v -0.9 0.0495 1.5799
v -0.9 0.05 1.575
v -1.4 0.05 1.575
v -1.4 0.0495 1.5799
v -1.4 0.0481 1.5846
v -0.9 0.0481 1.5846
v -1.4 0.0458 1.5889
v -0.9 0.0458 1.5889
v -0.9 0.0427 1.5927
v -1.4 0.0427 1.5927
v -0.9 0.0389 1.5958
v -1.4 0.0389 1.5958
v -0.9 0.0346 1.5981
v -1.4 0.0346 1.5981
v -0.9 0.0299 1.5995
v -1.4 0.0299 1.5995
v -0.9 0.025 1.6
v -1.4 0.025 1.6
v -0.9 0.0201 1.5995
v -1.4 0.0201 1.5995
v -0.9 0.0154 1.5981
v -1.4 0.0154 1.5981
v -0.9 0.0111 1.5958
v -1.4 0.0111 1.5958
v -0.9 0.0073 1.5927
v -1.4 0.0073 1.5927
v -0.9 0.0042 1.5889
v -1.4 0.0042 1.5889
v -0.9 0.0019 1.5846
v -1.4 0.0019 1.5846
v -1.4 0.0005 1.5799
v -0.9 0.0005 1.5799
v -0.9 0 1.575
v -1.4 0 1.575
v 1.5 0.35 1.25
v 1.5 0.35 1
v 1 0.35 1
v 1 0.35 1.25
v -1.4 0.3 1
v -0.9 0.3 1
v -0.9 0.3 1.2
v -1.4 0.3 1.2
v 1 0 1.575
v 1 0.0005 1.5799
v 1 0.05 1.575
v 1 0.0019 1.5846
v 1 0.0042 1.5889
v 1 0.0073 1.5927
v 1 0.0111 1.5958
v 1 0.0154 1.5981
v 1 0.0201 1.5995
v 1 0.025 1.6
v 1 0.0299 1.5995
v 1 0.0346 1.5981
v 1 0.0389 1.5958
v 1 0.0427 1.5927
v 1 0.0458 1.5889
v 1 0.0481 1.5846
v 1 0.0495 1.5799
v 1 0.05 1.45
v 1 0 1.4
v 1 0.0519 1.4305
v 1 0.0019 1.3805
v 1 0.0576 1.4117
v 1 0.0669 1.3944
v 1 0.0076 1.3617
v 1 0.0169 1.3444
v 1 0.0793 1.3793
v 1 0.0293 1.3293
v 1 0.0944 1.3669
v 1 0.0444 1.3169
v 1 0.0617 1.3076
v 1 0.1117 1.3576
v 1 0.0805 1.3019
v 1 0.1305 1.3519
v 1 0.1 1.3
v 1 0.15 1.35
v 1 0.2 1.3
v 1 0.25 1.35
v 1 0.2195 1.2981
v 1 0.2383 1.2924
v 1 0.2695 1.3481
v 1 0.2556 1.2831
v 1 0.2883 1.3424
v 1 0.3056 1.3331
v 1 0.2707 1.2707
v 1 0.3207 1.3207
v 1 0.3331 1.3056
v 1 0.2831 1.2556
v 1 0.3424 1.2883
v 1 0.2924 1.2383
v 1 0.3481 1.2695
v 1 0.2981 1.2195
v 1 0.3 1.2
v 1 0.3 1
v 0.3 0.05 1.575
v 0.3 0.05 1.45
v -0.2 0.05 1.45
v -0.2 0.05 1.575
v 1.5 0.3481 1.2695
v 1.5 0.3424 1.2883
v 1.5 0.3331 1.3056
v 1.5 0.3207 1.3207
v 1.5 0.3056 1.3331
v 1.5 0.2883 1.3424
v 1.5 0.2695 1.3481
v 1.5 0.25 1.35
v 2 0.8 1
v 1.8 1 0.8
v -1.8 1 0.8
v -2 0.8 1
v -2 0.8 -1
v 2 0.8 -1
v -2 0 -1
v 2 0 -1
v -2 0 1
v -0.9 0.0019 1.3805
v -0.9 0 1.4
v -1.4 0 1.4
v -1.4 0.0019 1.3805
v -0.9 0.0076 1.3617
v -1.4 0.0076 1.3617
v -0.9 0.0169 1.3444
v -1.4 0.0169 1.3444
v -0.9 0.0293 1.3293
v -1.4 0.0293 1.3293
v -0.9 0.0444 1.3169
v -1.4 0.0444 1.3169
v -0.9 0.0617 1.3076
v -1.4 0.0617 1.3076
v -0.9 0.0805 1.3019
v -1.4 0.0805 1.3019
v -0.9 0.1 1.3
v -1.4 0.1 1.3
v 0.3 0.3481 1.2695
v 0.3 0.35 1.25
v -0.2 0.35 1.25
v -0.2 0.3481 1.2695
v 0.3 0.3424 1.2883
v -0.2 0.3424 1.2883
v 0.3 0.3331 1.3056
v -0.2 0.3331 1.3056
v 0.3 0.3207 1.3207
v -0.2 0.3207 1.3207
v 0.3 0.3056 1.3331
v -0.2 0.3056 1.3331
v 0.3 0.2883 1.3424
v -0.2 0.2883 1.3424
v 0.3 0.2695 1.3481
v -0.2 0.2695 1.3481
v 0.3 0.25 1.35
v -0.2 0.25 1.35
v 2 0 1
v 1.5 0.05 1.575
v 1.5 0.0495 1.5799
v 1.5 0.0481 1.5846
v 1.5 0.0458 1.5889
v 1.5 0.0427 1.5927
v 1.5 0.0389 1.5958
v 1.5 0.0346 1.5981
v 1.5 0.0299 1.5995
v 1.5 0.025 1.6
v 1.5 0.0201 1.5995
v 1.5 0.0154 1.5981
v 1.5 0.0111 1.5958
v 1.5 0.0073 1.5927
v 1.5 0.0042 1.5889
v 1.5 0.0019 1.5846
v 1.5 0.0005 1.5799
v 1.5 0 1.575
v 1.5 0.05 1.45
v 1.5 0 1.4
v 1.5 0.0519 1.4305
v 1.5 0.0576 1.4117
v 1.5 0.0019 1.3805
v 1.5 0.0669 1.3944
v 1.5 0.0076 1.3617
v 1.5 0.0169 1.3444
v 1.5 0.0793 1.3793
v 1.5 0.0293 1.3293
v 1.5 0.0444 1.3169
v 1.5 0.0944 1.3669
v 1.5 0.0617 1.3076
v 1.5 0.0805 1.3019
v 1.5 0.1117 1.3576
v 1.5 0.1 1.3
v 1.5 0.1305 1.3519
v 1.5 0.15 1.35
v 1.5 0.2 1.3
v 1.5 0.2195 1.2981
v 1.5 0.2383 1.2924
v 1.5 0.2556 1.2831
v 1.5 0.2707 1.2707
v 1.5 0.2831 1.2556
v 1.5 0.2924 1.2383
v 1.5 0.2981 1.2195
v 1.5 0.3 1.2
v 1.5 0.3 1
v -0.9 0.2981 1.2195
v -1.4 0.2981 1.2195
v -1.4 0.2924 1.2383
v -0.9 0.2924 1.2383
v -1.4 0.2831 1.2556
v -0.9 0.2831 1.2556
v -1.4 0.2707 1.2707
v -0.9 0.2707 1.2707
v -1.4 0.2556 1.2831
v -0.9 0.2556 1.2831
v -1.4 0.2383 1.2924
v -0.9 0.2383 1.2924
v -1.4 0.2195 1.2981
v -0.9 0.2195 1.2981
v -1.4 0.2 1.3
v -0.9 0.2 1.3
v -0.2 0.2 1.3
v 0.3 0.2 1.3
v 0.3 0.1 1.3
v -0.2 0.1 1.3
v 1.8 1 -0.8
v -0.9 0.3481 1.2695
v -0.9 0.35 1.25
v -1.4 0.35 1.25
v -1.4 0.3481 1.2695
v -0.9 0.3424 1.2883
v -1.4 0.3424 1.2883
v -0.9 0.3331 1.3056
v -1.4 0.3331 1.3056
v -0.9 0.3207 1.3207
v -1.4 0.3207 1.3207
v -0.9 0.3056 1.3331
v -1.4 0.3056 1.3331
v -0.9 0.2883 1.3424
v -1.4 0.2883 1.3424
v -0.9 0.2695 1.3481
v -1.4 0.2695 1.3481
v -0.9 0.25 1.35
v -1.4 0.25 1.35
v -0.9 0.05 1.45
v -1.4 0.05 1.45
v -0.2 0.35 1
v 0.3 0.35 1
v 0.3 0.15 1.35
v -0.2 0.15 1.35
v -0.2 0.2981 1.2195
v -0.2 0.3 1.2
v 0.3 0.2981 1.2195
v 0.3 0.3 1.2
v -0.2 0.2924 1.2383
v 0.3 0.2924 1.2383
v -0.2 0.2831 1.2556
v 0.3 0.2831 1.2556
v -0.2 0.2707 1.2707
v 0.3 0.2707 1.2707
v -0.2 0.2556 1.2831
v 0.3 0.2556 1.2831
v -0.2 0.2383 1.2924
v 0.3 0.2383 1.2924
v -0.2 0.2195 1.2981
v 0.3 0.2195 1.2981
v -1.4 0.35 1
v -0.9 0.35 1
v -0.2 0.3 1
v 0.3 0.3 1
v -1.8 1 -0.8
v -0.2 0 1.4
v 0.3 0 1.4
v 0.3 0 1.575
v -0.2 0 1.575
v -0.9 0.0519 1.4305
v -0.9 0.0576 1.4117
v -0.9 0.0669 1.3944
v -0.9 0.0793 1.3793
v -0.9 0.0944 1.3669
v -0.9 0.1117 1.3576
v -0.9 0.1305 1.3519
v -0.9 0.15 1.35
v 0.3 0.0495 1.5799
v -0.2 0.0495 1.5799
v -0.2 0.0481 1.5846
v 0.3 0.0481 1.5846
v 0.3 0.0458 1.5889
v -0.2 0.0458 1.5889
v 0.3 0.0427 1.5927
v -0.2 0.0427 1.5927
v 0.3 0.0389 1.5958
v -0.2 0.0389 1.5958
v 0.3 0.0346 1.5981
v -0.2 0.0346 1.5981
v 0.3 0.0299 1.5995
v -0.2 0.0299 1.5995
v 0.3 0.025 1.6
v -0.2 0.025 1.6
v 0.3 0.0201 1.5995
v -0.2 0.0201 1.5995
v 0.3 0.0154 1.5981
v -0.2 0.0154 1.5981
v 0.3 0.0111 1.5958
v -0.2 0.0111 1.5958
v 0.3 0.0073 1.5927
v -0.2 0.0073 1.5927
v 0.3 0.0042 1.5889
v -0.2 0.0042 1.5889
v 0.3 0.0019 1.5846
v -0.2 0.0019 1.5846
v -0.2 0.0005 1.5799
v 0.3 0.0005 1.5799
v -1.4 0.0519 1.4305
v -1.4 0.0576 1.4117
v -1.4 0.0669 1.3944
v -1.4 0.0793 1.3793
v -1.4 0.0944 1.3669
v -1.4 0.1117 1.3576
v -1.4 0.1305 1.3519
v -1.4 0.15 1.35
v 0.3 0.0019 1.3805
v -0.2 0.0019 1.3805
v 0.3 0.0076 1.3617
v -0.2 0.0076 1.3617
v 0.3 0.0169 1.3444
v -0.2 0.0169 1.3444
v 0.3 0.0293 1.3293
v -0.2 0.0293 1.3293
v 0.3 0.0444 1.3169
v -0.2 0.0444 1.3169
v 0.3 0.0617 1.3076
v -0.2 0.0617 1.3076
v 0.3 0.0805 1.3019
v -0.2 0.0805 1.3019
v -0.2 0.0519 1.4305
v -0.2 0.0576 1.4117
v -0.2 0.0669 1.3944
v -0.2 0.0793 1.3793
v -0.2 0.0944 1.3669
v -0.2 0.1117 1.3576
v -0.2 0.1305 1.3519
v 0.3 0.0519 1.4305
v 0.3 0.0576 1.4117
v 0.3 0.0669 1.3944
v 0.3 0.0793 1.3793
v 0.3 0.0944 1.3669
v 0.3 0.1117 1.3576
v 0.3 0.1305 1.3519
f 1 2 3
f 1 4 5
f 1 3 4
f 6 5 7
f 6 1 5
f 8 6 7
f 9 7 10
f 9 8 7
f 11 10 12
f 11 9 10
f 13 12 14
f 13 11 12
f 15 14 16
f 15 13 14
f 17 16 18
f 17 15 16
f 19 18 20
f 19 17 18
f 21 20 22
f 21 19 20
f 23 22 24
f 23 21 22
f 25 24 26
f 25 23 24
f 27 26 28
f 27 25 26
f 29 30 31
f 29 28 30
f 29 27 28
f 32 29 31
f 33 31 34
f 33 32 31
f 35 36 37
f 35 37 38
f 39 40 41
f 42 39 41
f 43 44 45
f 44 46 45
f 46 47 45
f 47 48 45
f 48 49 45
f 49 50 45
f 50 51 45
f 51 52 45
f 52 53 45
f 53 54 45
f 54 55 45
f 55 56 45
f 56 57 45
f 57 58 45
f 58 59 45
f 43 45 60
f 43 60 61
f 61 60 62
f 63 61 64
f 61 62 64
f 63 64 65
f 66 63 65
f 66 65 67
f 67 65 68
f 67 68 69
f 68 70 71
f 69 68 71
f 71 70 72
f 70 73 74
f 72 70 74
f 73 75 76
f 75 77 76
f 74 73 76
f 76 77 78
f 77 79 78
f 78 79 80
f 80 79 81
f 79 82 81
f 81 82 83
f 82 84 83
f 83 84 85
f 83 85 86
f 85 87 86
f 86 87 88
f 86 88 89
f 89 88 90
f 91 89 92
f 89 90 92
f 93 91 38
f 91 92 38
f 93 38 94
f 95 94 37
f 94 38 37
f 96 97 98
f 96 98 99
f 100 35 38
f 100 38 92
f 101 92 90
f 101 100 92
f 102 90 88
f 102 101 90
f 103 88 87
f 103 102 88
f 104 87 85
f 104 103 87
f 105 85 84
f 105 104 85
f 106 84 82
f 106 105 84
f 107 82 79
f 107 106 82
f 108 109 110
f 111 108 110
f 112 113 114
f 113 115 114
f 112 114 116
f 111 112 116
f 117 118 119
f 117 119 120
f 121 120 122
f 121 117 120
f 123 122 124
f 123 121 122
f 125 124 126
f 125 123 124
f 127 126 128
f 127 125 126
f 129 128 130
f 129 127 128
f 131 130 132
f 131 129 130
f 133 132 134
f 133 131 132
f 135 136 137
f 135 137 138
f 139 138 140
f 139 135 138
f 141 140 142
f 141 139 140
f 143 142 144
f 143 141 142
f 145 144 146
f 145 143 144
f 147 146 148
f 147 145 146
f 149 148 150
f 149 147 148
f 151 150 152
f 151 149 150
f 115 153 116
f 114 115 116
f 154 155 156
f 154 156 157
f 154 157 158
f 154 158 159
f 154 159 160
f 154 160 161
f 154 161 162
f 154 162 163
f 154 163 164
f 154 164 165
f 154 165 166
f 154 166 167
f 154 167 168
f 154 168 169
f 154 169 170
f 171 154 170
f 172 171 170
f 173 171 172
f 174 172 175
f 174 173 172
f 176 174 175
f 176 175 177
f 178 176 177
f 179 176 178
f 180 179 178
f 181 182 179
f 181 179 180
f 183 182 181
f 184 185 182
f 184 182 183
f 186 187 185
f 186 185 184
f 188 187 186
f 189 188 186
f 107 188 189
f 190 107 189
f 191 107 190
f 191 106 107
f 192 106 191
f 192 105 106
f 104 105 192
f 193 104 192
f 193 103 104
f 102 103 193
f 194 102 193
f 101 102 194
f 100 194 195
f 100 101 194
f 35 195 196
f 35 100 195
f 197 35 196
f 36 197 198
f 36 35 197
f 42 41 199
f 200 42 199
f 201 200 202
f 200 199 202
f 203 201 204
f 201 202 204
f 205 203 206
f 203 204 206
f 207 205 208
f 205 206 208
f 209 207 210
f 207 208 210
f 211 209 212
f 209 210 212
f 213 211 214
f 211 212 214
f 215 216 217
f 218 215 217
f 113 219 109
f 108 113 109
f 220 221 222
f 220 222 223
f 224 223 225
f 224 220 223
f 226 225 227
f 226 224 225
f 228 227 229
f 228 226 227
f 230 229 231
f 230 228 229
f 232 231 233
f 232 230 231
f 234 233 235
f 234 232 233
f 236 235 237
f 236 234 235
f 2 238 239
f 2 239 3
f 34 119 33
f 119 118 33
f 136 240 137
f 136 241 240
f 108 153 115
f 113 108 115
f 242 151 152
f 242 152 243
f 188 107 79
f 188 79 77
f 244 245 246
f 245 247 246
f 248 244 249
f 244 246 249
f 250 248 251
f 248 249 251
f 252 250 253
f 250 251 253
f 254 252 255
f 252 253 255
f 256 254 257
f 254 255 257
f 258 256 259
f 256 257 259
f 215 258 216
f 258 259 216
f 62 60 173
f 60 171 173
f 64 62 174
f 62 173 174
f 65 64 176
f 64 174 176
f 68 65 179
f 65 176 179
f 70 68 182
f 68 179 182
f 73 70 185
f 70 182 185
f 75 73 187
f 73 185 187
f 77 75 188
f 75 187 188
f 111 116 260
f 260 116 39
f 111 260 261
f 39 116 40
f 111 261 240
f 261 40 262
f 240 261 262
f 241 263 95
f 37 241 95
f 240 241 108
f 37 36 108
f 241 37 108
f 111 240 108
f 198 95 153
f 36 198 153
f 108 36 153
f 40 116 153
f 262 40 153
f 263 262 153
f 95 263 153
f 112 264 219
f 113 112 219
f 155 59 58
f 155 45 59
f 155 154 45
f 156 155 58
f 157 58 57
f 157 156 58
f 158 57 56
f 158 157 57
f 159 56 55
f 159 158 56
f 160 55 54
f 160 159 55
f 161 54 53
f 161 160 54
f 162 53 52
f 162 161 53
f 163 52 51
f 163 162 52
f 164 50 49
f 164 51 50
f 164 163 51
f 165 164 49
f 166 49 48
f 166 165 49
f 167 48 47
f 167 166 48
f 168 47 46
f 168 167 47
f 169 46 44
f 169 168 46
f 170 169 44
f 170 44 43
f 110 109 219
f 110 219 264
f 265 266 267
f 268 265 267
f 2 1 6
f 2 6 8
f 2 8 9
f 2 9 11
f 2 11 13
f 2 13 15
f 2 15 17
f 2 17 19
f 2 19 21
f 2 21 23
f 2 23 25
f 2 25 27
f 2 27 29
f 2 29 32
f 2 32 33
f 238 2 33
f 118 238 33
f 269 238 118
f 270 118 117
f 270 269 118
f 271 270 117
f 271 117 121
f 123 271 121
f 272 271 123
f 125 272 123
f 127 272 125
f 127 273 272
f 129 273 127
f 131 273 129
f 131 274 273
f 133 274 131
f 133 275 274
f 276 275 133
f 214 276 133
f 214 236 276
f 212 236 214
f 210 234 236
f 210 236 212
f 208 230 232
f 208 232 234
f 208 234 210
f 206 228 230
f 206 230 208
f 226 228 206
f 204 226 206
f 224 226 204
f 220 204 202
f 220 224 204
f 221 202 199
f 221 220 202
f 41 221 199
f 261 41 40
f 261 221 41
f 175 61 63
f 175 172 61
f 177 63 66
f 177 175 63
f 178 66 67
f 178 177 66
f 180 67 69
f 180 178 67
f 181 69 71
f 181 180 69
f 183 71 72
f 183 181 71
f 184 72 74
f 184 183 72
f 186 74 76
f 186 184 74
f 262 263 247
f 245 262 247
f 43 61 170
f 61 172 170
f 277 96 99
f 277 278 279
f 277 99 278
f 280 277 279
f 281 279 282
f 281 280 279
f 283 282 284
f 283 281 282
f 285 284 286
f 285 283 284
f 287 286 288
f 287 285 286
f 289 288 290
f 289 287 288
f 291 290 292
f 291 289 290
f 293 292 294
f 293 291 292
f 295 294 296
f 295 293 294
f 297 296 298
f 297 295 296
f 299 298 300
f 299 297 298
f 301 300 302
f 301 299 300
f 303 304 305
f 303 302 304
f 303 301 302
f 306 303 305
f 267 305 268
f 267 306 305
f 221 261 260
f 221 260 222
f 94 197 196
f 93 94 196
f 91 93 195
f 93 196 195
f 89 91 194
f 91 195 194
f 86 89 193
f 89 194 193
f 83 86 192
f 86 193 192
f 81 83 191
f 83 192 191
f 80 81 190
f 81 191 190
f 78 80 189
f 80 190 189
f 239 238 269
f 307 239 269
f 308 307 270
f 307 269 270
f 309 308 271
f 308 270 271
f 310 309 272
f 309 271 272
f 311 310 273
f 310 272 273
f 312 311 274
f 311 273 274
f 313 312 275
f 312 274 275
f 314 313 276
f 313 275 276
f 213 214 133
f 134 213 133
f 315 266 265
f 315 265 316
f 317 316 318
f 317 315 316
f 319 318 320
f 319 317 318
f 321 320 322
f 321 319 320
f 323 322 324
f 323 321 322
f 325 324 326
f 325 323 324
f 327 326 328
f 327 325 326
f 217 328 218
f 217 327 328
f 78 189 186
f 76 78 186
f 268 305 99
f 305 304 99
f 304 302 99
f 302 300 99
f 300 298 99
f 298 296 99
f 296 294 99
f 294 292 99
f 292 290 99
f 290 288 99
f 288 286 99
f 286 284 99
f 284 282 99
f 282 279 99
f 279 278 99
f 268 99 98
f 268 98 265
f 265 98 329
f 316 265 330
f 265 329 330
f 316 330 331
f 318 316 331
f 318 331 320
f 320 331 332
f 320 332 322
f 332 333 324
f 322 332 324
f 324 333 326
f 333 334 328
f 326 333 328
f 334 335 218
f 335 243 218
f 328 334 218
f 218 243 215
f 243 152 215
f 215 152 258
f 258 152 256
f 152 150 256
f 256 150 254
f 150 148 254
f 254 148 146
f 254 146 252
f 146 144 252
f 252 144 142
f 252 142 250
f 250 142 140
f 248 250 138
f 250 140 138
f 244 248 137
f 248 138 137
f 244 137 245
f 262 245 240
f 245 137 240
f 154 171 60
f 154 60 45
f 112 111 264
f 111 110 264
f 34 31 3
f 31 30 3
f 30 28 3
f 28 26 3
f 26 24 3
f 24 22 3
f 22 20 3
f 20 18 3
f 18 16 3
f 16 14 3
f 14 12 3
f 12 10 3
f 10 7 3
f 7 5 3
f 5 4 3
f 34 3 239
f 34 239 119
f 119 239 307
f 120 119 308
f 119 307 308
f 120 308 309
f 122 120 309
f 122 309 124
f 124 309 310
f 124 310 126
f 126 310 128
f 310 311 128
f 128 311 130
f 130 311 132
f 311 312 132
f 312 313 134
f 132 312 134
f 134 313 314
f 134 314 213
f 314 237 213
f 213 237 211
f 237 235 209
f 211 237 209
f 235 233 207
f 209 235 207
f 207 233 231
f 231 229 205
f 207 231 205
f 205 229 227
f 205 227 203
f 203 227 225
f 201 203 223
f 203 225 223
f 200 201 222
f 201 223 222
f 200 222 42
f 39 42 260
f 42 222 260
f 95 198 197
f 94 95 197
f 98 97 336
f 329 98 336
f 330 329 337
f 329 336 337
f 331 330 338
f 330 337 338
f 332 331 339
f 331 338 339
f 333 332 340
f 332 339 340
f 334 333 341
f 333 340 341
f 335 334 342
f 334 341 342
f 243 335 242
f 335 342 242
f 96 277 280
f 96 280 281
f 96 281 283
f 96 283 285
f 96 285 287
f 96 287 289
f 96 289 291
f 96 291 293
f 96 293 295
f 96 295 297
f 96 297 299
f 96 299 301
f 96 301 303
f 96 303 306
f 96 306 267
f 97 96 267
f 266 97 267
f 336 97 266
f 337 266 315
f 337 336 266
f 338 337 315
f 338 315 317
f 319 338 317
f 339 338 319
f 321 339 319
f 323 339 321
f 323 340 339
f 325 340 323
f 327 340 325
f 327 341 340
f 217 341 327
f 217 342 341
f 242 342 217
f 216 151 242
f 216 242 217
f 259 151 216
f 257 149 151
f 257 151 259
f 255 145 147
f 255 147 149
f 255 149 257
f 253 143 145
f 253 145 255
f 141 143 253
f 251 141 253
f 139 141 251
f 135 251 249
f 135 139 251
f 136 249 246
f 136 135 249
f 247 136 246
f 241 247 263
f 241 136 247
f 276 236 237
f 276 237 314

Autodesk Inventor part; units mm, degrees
ref_plane "YZ Plane" through (0, 0, 0) normal (1, 0, 0) x (0, 1, 0)
ref_plane "XZ Plane" through (0, 0, 0) normal (0, 1, 0) x (-1, 0, 0)
sketch "Sketch1" plane through (0, 0, 0) normal (0, 1, 0) x (-1, 0, 0)
  line L0 (2, 1) -> (-2, 1)
  line L1 (-2, 1) -> (-2, -1)
  line L2 (-2, -1) -> (2, -1)
  line L3 (2, -1) -> (2, 1)
  line L4 (2, 1) -> (-2, -1) construction
  line L5 (-2, 1) -> (2, -1) construction
  point P0 (0, 0)
  dimension "d0" = 4
  dimension "d1" = 2
extrude "Extrusion1" add sketch "Sketch1" along normal blind 1
chamfer "Chamfer1" distance 0.2 angle 45 4 edges at (0, 1, 1) (2, 1, 0) (0, 1, -1) (-2, 1, 0)
ref_plane "Work Plane1" through (1.5, 0, 1) normal (1, 0, 0) x (0, 0, -1)
sketch "Sketch2" plane through (1.5, 0, 1) normal (1, 0, 0) x (0, 0, -1)
  line L0 (0, 0) -> (0, 0.8) projected
  line L1 (0, 0.3) -> (-0.2, 0.3)
  line L2 (-0.3, 0.2) -> (-0.3, 0.1)
  line L3 (-0.4, 0) -> (-0.575, 0)
  line L4 (0, 0) -> (2, 0) projected
  line L5 (0, 0.35) -> (-0.25, 0.35)
  line L6 (-0.35, 0.25) -> (-0.35, 0.15)
  line L7 (-0.45, 0.05) -> (-0.575, 0.05)
  line L8 (-0.6, 0.025) -> (-0.6, 0.025)
  arc A0 (-0.25, 0.35) -> (-0.35, 0.25) centre (-0.25, 0.25) ccw
  arc A1 (-0.2, 0.3) -> (-0.3, 0.2) centre (-0.2, 0.2) ccw
  arc A2 (-0.45, 0.05) -> (-0.35, 0.15) centre (-0.45, 0.15) ccw
  arc A3 (-0.4, 0) -> (-0.3, 0.1) centre (-0.4, 0.1) ccw
  arc A4 (-0.575, 0.05) -> (-0.6, 0.025) centre (-0.575, 0.025) ccw
  arc A5 (-0.6, 0.025) -> (-0.575, 0) centre (-0.575, 0.025) ccw
  point P0 (1, 0)
  point P1 (-0.3, 0.3)
  point P2 (-0.3, 0)
  point P3 (-0.6, 0)
  point P4 (0, 0.35)
  point P5 (-0.6, 0.025)
  dimension "d8" = 0.3
  dimension "d9" = 0.3
  dimension "d10" = 0.3
  dimension "d11" = 0.05
  dimension "d12" = 0.1
  dimension "d13" = 0.025
extrude "Extrusion2" add sketch "Sketch2" against normal blind 0.5
pattern_linear "Rectangular Pattern1" count 3 spacing 1.2 along (-1, 0, 0) of "Extrusion2"
properties part number "3V DC Regulator"
